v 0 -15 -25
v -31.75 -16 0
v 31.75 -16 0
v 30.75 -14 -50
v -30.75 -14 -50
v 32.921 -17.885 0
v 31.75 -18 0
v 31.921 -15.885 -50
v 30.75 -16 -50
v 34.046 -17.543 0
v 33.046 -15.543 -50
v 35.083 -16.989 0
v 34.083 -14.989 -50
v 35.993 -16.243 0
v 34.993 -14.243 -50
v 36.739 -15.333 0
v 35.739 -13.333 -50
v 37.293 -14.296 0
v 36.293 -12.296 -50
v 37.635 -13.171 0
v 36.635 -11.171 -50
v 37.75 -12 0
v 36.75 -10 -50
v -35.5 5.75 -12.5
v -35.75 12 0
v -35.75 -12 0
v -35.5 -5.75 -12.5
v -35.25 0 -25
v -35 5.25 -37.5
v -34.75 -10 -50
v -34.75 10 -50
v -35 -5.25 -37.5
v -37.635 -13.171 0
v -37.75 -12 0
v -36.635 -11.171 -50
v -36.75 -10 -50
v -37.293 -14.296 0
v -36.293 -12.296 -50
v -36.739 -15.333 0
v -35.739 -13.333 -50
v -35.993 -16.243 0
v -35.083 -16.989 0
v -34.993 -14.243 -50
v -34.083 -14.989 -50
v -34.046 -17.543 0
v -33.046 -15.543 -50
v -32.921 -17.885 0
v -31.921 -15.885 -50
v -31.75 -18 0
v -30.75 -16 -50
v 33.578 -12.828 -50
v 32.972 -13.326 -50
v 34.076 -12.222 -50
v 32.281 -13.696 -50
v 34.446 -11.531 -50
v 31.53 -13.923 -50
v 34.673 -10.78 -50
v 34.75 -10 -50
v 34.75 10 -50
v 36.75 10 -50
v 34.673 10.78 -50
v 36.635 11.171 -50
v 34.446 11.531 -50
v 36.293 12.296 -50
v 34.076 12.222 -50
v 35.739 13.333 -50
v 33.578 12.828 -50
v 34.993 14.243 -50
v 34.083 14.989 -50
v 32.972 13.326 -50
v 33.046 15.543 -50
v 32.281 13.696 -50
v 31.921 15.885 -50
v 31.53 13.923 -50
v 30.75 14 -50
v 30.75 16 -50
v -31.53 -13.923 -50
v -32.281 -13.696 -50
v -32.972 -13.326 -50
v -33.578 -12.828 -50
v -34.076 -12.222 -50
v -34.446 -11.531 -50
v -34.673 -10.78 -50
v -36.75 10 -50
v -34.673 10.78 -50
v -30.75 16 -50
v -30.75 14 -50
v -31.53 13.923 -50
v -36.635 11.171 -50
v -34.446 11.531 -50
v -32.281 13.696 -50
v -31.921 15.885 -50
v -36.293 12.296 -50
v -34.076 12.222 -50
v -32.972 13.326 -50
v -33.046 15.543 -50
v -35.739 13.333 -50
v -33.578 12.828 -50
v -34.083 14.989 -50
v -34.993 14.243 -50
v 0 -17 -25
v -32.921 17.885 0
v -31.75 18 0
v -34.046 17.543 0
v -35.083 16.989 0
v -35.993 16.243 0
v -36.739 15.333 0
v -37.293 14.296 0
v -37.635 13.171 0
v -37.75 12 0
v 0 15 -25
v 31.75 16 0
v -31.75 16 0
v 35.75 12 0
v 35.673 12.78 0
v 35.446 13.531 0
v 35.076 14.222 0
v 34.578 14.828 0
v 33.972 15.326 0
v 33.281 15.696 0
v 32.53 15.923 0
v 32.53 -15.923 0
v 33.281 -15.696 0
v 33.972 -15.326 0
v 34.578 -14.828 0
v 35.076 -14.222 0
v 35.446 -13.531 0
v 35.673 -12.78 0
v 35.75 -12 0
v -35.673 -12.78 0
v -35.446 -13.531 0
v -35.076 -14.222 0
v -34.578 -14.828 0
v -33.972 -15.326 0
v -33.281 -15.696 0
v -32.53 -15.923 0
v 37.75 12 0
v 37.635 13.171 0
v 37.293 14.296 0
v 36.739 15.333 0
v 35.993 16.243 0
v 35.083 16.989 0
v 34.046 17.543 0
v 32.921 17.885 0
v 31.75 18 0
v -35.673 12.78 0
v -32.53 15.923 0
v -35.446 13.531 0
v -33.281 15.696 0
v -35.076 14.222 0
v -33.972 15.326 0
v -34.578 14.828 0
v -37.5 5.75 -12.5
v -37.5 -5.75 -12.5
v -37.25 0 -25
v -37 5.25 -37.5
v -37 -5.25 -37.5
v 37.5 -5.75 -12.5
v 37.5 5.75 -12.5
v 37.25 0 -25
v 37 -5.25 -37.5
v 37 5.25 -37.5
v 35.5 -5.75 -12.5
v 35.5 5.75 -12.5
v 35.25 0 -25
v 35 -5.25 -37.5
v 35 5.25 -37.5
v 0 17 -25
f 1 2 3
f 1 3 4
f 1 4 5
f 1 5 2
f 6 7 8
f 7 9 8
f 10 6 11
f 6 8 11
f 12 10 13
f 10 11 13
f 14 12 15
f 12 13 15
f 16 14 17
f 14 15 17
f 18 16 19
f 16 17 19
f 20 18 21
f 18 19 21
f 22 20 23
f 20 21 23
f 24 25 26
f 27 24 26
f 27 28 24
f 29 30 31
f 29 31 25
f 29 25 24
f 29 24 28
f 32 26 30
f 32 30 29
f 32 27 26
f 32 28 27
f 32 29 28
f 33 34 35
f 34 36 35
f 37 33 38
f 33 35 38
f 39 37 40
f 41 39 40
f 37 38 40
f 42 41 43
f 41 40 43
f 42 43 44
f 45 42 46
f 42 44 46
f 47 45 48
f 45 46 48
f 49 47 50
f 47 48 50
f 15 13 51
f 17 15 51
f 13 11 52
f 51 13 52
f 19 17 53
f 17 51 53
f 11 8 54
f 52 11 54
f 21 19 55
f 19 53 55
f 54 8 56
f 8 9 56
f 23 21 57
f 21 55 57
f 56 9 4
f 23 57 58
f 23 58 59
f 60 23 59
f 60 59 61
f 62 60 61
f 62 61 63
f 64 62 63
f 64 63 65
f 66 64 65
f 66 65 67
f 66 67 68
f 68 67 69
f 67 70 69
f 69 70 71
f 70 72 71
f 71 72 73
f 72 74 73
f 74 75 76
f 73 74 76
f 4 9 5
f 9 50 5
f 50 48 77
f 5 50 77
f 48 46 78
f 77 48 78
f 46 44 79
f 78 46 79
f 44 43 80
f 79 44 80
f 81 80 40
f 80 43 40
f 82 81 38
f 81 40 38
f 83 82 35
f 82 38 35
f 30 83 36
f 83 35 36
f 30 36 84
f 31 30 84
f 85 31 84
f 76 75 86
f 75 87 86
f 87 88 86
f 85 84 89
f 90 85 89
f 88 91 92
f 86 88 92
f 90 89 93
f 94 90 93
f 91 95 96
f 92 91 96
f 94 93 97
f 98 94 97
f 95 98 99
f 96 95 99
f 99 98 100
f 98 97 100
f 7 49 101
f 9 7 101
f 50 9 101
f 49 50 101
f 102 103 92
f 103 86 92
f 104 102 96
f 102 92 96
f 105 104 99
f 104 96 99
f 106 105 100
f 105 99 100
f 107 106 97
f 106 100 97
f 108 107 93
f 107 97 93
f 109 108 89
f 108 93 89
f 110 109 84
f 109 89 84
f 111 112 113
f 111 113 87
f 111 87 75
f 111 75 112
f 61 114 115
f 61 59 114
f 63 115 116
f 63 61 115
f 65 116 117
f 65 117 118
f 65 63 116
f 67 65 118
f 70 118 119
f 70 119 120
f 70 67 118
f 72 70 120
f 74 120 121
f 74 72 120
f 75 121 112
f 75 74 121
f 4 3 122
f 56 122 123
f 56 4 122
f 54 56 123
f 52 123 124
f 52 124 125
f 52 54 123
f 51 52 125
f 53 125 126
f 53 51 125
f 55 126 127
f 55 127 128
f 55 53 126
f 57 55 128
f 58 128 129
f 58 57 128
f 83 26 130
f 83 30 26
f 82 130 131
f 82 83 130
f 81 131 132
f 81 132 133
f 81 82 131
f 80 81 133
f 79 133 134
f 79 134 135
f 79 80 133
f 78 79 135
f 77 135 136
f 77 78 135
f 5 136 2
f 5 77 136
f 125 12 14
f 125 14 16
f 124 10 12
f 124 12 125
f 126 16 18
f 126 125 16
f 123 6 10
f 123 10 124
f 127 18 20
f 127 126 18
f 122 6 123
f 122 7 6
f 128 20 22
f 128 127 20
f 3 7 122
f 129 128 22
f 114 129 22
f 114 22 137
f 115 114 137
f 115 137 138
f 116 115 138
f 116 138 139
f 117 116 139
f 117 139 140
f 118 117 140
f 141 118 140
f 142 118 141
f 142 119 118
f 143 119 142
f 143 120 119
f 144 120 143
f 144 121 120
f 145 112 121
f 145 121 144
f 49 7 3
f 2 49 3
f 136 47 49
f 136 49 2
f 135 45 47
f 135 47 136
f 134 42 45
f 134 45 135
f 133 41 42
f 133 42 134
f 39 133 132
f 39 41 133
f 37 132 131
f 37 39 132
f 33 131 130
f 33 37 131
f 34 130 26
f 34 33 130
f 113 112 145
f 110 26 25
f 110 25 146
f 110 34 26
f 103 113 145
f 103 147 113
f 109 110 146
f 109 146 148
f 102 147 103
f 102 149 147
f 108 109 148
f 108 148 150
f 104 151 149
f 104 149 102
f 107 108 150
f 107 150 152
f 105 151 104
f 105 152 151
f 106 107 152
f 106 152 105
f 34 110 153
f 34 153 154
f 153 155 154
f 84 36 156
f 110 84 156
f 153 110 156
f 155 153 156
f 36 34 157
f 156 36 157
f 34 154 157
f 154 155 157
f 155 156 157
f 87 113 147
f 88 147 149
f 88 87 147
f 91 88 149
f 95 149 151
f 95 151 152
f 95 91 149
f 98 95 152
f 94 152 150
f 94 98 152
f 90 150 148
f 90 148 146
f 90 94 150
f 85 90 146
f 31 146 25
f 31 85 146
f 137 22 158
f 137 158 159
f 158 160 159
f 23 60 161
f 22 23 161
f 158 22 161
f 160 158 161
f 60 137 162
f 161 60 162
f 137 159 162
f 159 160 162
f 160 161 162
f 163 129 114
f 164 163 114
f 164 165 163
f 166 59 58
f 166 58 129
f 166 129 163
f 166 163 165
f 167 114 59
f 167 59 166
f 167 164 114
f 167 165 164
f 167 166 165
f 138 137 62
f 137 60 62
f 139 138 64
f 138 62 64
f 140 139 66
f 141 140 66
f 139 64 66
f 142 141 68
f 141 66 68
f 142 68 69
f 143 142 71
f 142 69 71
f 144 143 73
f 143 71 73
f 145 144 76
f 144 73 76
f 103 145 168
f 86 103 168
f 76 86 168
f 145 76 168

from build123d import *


with BuildPart() as f5:
    # F3 (on Top) → F5 section 0
    with BuildSketch(Plane.XY):
        with BuildLine():
            Line((31.75, 18), (-31.75, 18))
            ThreePointArc((-31.75, 18), (-35.992641, 16.242641), (-37.75, 12))
            Line((-37.75, 12), (-37.75, -12))
            ThreePointArc((-37.75, -12), (-35.992641, -16.242641), (-31.75, -18))
            Line((-31.75, -18), (31.75, -18))
            ThreePointArc((31.75, -18), (35.992641, -16.242641), (37.75, -12))
            Line((37.75, -12), (37.75, 12))
            ThreePointArc((37.75, 12), (35.992641, 16.242641), (31.75, 18))
        make_face()
    # F4 (on offset) → F5 section 1
    with BuildSketch(Plane.XY.offset(-50)):
        with BuildLine():
            Line((30.75, 16), (-30.75, 16))
            ThreePointArc((-30.75, 16), (-34.992641, 14.242641), (-36.75, 10))
            Line((-36.75, 10), (-36.75, -10))
            ThreePointArc((-36.75, -10), (-34.992641, -14.242641), (-30.75, -16))
            Line((-30.75, -16), (30.75, -16))
            ThreePointArc((30.75, -16), (34.992641, -14.242641), (36.75, -10))
            Line((36.75, -10), (36.75, 10))
            ThreePointArc((36.75, 10), (34.992641, 14.242641), (30.75, 16))
        make_face()
    loft()

    # F0 (on Top) → F6 section 0
    with BuildSketch(Plane.XY):
        with BuildLine():
            Line((31.75, 16), (-31.75, 16))
            ThreePointArc((-31.75, 16), (-34.578427, 14.828427), (-35.75, 12))
            Line((-35.75, 12), (-35.75, -12))
            ThreePointArc((-35.75, -12), (-34.578427, -14.828427), (-31.75, -16))
            Line((-31.75, -16), (31.75, -16))
            ThreePointArc((31.75, -16), (34.578427, -14.828427), (35.75, -12))
            Line((35.75, -12), (35.75, 12))
            ThreePointArc((35.75, 12), (34.578427, 14.828427), (31.75, 16))
        make_face()
    # F2 (on offset) → F6 section 1
    with BuildSketch(Plane.XY.offset(-50)):
        with BuildLine():
            Line((30.75, 14), (-30.75, 14))
            ThreePointArc((-30.75, 14), (-33.578427, 12.828427), (-34.75, 10))
            Line((-34.75, 10), (-34.75, -10))
            ThreePointArc((-34.75, -10), (-33.578427, -12.828427), (-30.75, -14))
            Line((-30.75, -14), (30.75, -14))
            ThreePointArc((30.75, -14), (33.578427, -12.828427), (34.75, -10))
            Line((34.75, -10), (34.75, 10))
            ThreePointArc((34.75, 10), (33.578427, 12.828427), (30.75, 14))
        make_face()
    loft(mode=Mode.SUBTRACT)


solid = f5.part
